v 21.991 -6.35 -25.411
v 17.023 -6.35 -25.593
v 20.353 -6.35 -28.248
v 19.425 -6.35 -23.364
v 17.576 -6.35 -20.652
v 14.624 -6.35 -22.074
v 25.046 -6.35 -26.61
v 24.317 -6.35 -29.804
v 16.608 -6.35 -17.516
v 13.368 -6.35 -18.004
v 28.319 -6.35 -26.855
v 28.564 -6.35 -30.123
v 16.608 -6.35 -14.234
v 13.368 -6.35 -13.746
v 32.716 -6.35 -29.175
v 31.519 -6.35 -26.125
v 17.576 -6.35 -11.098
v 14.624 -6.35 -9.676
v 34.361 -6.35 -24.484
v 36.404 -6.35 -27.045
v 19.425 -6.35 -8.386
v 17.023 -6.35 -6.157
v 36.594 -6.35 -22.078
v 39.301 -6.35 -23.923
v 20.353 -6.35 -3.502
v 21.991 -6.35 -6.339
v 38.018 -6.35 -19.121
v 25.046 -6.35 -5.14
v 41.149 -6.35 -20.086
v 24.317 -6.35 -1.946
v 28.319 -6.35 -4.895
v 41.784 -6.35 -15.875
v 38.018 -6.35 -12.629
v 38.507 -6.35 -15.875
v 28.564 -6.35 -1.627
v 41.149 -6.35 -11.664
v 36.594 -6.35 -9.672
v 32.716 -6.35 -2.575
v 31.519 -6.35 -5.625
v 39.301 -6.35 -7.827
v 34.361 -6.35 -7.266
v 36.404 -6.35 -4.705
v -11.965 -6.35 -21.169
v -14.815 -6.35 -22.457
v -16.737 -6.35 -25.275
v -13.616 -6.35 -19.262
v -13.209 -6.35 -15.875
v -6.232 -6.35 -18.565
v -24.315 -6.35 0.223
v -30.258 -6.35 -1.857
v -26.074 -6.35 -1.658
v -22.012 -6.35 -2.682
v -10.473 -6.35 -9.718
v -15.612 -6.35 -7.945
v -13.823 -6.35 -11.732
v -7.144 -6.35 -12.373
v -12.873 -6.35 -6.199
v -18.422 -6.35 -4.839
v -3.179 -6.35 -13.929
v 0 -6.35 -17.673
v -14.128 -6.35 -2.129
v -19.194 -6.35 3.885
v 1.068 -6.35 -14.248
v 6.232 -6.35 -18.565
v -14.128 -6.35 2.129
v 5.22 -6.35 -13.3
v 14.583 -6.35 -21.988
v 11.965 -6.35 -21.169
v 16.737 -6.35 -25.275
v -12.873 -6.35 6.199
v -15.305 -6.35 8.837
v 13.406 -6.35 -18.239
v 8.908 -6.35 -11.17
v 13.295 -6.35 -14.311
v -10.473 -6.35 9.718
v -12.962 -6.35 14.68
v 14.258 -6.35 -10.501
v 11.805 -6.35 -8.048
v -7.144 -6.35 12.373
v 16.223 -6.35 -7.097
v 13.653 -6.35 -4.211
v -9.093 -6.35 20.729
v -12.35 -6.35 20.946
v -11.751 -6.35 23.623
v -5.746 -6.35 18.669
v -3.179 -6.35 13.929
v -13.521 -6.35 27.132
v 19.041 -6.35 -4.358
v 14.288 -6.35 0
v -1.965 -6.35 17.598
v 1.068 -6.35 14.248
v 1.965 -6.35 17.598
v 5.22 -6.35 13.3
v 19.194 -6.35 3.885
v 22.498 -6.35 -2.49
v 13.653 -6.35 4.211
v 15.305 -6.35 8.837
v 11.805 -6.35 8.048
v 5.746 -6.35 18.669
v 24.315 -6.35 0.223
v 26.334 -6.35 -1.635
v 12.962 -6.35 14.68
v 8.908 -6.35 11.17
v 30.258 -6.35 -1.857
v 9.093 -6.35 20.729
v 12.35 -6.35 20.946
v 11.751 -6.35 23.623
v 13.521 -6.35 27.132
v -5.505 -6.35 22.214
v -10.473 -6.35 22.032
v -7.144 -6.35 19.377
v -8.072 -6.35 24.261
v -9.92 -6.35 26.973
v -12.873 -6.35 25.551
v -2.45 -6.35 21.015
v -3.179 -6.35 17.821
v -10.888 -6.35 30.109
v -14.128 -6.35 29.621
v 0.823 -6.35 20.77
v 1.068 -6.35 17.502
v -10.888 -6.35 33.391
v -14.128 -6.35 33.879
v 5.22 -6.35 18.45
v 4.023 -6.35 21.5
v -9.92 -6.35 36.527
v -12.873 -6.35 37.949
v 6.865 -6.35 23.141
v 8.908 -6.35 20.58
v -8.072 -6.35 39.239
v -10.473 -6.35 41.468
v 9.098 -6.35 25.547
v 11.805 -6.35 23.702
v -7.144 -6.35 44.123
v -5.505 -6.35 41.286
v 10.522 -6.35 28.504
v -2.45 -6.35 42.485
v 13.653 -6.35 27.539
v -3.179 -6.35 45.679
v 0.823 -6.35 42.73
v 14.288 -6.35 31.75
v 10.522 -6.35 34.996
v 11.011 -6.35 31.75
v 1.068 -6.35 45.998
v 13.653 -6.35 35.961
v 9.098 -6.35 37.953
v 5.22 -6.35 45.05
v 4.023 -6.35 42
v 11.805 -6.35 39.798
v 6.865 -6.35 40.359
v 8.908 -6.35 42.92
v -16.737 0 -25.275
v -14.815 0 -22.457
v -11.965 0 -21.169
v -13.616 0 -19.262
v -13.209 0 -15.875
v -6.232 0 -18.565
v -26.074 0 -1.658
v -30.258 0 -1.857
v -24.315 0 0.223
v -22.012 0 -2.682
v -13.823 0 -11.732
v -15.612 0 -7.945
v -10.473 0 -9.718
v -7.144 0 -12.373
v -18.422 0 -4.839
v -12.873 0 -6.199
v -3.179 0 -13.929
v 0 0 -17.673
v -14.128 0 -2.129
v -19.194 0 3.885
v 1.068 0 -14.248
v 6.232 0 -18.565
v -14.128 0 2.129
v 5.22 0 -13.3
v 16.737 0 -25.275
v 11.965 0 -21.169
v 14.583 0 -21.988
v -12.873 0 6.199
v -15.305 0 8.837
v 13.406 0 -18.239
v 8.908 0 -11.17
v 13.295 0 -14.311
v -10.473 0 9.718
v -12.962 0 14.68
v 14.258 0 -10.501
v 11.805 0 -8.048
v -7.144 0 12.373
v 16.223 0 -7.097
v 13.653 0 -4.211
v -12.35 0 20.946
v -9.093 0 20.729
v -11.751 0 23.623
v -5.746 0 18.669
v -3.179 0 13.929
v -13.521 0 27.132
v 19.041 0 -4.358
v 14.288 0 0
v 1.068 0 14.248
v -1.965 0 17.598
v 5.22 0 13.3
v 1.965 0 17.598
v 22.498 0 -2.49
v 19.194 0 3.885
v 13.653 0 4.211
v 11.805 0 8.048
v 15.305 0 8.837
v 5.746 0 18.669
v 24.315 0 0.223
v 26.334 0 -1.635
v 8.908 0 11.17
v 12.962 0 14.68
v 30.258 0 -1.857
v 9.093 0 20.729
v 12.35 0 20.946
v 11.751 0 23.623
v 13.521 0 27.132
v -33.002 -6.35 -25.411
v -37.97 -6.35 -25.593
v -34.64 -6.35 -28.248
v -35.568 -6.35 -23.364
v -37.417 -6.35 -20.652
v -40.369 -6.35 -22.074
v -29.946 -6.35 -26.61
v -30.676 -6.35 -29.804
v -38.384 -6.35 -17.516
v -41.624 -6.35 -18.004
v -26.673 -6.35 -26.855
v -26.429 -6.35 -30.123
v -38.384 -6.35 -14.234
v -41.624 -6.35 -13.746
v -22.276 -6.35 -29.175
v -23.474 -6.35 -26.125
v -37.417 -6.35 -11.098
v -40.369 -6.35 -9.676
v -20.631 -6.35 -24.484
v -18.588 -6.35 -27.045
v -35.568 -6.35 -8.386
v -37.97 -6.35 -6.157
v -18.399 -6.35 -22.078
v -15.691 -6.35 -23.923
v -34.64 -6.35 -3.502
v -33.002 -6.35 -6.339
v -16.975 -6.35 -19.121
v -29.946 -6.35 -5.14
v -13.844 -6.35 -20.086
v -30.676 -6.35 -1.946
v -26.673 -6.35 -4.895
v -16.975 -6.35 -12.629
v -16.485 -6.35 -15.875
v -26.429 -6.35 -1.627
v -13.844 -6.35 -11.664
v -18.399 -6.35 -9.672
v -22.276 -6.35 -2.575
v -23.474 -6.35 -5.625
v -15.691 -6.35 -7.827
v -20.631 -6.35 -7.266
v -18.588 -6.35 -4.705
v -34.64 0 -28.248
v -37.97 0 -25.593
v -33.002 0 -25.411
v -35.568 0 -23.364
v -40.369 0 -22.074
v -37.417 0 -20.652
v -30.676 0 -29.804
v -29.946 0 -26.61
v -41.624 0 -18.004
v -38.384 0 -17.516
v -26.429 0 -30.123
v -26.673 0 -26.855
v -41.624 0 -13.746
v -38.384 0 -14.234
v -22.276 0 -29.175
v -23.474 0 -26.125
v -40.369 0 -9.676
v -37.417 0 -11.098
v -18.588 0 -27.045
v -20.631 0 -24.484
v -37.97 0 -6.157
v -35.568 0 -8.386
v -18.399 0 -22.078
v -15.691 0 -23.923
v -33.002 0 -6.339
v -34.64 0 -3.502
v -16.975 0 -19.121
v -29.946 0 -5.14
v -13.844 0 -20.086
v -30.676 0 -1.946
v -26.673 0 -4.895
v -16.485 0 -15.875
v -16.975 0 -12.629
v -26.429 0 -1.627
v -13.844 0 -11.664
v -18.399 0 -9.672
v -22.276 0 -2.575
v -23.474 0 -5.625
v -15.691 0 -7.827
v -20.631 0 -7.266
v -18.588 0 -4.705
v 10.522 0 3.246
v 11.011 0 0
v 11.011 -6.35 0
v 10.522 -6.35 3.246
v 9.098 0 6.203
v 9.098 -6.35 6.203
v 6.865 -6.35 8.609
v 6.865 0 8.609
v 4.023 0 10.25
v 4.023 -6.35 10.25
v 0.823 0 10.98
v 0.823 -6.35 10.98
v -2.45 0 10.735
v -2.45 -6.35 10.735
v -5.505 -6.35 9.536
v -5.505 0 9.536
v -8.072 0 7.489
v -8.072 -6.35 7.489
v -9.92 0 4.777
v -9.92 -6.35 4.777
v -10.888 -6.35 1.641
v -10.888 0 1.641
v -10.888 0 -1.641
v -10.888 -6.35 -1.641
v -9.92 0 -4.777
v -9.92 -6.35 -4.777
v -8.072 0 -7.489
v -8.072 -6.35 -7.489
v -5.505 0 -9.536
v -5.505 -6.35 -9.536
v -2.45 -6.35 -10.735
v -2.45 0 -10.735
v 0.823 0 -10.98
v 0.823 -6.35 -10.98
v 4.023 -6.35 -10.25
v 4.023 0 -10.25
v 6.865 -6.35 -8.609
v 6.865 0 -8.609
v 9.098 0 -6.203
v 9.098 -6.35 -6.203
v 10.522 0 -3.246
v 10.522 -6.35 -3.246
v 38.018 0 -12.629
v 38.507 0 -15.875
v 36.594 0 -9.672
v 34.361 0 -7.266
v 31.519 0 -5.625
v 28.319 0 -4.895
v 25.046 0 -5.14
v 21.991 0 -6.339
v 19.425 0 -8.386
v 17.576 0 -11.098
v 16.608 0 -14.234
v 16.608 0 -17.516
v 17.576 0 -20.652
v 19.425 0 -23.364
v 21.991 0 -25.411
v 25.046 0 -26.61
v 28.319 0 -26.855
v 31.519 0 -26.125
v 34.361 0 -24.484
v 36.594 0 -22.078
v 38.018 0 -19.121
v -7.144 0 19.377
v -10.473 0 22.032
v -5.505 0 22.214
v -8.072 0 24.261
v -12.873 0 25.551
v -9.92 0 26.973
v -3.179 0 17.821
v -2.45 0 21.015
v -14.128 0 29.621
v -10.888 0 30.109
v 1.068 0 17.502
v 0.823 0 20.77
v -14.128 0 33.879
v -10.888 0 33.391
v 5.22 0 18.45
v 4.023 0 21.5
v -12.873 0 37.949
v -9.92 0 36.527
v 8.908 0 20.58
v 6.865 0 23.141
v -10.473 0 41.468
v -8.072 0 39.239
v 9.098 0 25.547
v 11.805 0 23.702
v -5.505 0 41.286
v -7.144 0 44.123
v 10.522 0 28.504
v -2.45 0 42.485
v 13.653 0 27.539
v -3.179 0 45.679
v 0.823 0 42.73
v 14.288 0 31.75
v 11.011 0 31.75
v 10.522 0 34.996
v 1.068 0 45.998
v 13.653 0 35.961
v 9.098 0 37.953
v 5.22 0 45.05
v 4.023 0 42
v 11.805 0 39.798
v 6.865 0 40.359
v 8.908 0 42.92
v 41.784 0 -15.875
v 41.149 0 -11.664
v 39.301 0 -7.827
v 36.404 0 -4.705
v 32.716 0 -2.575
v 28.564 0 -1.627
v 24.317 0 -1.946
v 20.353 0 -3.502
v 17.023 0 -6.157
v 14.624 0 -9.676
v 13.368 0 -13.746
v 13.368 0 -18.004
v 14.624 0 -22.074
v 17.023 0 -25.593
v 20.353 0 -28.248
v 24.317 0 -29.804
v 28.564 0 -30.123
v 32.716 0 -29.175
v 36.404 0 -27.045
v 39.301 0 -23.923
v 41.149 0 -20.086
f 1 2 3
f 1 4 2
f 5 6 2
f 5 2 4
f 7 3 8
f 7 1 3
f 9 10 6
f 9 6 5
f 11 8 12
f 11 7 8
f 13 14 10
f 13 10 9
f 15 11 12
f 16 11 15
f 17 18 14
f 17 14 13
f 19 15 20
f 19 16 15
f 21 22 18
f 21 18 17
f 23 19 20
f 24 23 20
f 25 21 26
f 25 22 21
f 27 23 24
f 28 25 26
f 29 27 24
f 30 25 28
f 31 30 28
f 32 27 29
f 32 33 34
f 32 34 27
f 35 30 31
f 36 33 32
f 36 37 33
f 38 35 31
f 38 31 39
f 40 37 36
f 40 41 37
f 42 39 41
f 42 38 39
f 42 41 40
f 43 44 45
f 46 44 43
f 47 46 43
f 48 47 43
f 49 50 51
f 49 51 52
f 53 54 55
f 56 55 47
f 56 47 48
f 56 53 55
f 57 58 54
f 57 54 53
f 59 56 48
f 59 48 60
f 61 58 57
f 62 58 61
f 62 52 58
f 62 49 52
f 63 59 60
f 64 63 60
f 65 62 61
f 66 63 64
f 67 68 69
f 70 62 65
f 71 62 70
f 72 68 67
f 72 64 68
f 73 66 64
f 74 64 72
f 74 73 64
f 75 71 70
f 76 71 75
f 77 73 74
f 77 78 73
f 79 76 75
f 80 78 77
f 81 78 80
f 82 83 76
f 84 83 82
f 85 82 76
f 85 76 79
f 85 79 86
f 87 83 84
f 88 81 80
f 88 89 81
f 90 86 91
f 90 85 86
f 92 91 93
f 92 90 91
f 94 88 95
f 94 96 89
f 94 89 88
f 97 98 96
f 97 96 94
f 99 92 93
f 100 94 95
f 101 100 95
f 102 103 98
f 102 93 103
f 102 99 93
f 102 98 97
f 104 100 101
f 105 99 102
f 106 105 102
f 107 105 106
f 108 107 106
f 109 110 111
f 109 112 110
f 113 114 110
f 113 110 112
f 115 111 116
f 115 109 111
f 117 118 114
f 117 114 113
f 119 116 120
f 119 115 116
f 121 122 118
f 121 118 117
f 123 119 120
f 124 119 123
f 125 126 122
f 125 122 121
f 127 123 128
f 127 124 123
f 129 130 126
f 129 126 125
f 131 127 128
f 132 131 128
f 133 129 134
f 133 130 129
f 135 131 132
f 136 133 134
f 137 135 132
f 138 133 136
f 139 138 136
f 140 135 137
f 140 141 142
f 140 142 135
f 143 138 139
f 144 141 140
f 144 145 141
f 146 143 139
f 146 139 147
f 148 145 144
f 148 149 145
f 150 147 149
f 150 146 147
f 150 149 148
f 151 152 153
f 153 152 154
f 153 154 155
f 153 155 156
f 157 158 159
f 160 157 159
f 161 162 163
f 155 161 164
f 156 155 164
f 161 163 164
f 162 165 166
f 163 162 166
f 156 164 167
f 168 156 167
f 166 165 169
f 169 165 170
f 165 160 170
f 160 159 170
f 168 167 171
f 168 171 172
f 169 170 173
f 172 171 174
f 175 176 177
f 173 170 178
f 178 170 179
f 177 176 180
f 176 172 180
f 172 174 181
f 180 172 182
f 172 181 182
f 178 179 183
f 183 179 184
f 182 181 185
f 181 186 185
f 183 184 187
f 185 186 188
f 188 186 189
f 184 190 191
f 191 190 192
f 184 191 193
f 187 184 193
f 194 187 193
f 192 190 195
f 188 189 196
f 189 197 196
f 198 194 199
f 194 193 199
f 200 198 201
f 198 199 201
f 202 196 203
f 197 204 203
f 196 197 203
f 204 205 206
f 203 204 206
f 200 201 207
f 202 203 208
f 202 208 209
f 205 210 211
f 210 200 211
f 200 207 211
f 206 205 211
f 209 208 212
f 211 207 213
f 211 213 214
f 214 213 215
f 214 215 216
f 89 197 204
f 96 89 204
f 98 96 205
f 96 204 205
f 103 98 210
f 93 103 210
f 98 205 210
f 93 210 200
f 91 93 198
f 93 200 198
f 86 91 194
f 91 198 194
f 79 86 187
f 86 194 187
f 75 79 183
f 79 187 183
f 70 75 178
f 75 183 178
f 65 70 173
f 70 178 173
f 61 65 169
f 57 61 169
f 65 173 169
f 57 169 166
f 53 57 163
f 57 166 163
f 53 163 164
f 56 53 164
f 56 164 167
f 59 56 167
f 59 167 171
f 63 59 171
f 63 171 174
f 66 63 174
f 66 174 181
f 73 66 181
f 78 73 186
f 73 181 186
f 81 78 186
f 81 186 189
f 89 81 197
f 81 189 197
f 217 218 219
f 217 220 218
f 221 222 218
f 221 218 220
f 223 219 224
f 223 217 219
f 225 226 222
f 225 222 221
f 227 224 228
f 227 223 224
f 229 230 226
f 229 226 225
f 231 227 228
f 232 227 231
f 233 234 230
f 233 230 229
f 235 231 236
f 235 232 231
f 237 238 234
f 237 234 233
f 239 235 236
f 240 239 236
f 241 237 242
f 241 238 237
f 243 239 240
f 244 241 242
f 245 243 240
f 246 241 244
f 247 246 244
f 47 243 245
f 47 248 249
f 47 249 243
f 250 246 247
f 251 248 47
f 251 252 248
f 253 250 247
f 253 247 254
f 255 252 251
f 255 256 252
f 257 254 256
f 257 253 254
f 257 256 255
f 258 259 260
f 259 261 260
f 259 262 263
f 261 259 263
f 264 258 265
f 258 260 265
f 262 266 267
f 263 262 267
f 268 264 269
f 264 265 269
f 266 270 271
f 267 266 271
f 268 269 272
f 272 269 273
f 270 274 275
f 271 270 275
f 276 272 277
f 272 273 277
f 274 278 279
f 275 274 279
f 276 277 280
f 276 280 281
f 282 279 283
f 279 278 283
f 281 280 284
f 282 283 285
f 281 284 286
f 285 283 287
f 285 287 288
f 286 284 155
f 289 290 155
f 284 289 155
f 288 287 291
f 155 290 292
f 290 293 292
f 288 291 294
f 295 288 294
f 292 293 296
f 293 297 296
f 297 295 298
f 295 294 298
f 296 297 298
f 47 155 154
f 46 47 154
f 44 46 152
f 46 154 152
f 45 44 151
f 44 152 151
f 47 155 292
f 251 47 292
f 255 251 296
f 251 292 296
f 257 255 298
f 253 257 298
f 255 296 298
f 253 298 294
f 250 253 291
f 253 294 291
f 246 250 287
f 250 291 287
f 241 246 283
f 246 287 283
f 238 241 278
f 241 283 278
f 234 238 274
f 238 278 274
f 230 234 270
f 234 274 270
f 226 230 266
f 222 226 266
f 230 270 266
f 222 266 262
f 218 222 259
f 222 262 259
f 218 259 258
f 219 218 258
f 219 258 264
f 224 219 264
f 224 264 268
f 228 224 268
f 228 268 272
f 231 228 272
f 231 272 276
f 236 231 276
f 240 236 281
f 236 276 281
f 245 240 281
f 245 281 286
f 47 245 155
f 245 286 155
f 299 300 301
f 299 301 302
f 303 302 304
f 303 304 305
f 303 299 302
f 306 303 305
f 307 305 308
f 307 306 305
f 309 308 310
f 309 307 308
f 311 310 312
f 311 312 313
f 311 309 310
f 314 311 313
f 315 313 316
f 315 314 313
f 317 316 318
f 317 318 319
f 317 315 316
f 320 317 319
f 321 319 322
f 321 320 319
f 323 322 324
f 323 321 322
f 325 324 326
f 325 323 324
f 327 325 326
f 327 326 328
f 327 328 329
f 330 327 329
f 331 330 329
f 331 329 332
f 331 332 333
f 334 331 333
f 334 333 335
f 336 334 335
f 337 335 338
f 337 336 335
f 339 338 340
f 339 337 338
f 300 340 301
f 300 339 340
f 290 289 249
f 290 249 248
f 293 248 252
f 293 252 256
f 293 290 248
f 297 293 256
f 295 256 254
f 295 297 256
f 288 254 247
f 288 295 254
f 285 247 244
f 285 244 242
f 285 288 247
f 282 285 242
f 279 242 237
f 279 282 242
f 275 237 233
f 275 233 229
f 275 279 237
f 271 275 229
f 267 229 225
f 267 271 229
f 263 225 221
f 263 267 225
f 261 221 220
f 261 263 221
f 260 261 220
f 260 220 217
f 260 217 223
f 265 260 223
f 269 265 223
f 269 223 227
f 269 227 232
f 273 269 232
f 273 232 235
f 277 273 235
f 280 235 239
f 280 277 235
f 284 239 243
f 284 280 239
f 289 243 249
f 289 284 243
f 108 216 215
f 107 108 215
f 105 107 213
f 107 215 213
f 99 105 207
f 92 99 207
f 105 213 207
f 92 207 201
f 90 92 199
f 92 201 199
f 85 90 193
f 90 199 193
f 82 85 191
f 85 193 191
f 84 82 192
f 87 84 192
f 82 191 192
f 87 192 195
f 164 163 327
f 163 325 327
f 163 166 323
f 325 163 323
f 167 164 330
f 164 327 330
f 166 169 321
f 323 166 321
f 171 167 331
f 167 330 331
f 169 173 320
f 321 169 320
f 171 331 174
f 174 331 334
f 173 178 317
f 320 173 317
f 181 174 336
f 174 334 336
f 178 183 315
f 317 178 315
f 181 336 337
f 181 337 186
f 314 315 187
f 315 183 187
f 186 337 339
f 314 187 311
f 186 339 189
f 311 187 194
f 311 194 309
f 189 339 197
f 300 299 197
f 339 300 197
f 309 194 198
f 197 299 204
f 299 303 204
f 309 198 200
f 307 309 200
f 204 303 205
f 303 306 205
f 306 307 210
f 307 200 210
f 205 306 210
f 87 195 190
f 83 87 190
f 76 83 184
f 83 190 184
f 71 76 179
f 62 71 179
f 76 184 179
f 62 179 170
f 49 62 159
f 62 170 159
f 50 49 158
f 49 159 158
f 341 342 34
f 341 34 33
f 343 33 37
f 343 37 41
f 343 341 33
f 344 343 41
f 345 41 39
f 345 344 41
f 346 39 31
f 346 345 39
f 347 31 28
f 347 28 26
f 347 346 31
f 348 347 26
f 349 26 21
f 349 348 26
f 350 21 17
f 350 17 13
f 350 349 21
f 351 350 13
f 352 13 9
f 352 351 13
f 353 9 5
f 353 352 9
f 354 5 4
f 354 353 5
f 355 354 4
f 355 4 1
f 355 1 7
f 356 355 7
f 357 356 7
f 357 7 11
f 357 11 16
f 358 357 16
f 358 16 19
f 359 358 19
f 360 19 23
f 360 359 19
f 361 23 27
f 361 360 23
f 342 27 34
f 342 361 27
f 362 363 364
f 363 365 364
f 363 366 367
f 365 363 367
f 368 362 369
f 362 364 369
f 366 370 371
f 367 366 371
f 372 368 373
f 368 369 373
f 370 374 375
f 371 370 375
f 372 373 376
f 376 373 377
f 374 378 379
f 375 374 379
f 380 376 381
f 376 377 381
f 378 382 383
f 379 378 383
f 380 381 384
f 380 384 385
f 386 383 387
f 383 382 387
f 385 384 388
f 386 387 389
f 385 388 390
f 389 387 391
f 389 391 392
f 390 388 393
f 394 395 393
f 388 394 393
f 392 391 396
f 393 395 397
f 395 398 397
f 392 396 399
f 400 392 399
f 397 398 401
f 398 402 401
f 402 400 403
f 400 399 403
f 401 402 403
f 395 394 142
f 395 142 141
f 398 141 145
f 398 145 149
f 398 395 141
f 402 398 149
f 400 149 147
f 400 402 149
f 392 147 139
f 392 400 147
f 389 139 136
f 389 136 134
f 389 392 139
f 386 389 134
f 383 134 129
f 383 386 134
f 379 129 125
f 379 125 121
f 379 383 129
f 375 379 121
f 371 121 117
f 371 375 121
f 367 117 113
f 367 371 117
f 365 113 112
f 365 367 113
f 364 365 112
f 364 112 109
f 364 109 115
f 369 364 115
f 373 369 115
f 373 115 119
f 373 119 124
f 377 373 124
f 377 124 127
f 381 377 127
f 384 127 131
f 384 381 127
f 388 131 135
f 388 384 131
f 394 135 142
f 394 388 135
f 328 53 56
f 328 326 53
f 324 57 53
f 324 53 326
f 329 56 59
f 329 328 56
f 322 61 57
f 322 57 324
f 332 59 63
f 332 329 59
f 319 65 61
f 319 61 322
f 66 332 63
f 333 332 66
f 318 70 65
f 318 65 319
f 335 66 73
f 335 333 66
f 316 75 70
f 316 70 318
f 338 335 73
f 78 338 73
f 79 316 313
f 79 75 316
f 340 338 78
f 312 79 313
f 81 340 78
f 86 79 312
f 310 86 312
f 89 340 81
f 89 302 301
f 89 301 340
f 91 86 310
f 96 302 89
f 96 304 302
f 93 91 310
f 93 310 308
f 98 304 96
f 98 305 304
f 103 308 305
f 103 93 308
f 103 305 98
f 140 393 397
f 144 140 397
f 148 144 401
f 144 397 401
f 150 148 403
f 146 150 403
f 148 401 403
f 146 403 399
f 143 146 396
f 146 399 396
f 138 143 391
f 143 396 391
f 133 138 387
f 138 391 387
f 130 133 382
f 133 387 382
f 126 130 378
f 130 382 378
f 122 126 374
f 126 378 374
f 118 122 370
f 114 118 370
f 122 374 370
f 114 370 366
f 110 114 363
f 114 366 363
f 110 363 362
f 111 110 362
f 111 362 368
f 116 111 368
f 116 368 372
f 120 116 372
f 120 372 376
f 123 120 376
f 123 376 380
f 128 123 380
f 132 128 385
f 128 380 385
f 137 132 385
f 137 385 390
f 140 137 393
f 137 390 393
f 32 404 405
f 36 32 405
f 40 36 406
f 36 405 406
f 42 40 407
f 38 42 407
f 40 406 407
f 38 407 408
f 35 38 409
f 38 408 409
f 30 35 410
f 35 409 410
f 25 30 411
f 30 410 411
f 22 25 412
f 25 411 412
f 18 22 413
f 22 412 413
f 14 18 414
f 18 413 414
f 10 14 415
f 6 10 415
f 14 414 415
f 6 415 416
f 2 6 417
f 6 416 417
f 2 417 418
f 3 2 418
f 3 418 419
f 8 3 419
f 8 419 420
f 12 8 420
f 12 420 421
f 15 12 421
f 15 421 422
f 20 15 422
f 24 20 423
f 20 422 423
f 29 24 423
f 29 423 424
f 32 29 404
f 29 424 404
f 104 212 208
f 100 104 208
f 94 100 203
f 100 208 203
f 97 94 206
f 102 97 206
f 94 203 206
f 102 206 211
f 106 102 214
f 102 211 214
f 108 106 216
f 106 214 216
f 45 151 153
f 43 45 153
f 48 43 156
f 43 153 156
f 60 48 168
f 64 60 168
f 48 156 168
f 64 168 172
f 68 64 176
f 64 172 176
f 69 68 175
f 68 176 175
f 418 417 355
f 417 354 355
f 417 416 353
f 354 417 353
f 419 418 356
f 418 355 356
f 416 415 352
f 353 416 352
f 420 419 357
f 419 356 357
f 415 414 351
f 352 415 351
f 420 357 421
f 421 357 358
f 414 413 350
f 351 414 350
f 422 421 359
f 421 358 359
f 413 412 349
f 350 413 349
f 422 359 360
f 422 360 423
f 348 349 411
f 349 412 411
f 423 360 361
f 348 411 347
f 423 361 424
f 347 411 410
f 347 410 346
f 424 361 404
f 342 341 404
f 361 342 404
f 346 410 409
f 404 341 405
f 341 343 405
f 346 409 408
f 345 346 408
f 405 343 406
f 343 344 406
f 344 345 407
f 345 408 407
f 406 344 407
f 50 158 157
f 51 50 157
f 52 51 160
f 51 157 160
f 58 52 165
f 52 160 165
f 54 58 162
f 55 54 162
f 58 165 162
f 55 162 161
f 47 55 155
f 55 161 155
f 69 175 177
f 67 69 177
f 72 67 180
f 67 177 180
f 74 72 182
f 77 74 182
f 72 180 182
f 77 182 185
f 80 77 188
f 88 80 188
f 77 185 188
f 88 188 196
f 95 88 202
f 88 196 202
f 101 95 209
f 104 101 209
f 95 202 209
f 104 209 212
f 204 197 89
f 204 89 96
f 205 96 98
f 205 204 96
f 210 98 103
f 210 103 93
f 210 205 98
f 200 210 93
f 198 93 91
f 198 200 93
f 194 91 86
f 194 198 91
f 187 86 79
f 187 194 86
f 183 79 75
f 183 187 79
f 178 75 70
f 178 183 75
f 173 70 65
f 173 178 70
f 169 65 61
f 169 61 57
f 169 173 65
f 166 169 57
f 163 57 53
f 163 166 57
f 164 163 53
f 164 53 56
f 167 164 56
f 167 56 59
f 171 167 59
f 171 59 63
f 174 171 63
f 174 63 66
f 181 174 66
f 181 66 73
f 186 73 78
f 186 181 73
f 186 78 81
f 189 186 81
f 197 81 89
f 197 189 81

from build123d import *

# Parameters (mm, degrees)
F0_R     = 14.2875
F0_R_2   = 11.0109
F2_DEPTH = 6.35
F1_R     = 14.2875


with BuildPart() as f2:
    # F0 (on Front) → F2 (new body)
    with BuildSketch(Plane.XZ):
        Circle(F0_R)
        Circle(F0_R_2, mode=Mode.SUBTRACT)
    extrude(amount=F2_DEPTH)


with BuildPart() as f2b:
    # F0 (on Front) → F2, piece 2 (new body)
    with BuildSketch(Plane.XZ):
        with Locations((27.4963065702, -15.875)):
            Circle(F0_R)
        with Locations((27.4963065702, -15.875)):
            Circle(F0_R_2, mode=Mode.SUBTRACT)
    extrude(amount=F2_DEPTH)


with BuildPart() as f2c:
    # F0 (on Front) → F2, piece 3 (new body)
    with BuildSketch(Plane.XZ):
        with Locations((-27.4963065702, -15.875)):
            Circle(F0_R)
        with Locations((-27.4963065702, -15.875)):
            Circle(F0_R_2, mode=Mode.SUBTRACT)
    extrude(amount=F2_DEPTH)


with BuildPart() as f2d:
    # F0 (on Front) → F2, piece 4 (new body)
    with BuildSketch(Plane.XZ):
        with Locations((0, 31.75)):
            Circle(F0_R)
        with Locations((0, 31.75)):
            Circle(F0_R_2, mode=Mode.SUBTRACT)
    extrude(amount=F2_DEPTH)


with BuildPart() as f2e:
    # F1 (on Front) → F2, piece 5 (new body)
    with BuildSketch(Plane.XZ):
        with BuildLine():
            ThreePointArc((-13.5206938879, 27.1322632123), (-15.305469781, 8.8366170981), (-30.257576148, -1.8568672225))
            ThreePointArc((-30.257576148, -1.8568672225), (-18.4221394691, -4.8390520266), (-13.2088065702, -15.875))
            ThreePointArc((-13.2088065702, -15.875), (-14.1198733557, -20.8953277493), (-16.7368822601, -25.2753959899))
            ThreePointArc((-16.7368822601, -25.2753959899), (0, -17.6732341963), (16.7368822601, -25.2753959899))
            ThreePointArc((16.7368822601, -25.2753959899), (15.1229686136, -8.73125), (30.257576148, -1.8568672225))
            ThreePointArc((30.257576148, -1.8568672225), (15.305469781, 8.8366170981), (13.5206938879, 27.1322632123))
            ThreePointArc((13.5206938879, 27.1322632123), (0, 17.4625), (-13.5206938879, 27.1322632123))
        make_face()
        Circle(F1_R, mode=Mode.SUBTRACT)
    extrude(amount=F2_DEPTH)


solid = Compound([f2.part, f2b.part, f2c.part, f2d.part, f2e.part])
